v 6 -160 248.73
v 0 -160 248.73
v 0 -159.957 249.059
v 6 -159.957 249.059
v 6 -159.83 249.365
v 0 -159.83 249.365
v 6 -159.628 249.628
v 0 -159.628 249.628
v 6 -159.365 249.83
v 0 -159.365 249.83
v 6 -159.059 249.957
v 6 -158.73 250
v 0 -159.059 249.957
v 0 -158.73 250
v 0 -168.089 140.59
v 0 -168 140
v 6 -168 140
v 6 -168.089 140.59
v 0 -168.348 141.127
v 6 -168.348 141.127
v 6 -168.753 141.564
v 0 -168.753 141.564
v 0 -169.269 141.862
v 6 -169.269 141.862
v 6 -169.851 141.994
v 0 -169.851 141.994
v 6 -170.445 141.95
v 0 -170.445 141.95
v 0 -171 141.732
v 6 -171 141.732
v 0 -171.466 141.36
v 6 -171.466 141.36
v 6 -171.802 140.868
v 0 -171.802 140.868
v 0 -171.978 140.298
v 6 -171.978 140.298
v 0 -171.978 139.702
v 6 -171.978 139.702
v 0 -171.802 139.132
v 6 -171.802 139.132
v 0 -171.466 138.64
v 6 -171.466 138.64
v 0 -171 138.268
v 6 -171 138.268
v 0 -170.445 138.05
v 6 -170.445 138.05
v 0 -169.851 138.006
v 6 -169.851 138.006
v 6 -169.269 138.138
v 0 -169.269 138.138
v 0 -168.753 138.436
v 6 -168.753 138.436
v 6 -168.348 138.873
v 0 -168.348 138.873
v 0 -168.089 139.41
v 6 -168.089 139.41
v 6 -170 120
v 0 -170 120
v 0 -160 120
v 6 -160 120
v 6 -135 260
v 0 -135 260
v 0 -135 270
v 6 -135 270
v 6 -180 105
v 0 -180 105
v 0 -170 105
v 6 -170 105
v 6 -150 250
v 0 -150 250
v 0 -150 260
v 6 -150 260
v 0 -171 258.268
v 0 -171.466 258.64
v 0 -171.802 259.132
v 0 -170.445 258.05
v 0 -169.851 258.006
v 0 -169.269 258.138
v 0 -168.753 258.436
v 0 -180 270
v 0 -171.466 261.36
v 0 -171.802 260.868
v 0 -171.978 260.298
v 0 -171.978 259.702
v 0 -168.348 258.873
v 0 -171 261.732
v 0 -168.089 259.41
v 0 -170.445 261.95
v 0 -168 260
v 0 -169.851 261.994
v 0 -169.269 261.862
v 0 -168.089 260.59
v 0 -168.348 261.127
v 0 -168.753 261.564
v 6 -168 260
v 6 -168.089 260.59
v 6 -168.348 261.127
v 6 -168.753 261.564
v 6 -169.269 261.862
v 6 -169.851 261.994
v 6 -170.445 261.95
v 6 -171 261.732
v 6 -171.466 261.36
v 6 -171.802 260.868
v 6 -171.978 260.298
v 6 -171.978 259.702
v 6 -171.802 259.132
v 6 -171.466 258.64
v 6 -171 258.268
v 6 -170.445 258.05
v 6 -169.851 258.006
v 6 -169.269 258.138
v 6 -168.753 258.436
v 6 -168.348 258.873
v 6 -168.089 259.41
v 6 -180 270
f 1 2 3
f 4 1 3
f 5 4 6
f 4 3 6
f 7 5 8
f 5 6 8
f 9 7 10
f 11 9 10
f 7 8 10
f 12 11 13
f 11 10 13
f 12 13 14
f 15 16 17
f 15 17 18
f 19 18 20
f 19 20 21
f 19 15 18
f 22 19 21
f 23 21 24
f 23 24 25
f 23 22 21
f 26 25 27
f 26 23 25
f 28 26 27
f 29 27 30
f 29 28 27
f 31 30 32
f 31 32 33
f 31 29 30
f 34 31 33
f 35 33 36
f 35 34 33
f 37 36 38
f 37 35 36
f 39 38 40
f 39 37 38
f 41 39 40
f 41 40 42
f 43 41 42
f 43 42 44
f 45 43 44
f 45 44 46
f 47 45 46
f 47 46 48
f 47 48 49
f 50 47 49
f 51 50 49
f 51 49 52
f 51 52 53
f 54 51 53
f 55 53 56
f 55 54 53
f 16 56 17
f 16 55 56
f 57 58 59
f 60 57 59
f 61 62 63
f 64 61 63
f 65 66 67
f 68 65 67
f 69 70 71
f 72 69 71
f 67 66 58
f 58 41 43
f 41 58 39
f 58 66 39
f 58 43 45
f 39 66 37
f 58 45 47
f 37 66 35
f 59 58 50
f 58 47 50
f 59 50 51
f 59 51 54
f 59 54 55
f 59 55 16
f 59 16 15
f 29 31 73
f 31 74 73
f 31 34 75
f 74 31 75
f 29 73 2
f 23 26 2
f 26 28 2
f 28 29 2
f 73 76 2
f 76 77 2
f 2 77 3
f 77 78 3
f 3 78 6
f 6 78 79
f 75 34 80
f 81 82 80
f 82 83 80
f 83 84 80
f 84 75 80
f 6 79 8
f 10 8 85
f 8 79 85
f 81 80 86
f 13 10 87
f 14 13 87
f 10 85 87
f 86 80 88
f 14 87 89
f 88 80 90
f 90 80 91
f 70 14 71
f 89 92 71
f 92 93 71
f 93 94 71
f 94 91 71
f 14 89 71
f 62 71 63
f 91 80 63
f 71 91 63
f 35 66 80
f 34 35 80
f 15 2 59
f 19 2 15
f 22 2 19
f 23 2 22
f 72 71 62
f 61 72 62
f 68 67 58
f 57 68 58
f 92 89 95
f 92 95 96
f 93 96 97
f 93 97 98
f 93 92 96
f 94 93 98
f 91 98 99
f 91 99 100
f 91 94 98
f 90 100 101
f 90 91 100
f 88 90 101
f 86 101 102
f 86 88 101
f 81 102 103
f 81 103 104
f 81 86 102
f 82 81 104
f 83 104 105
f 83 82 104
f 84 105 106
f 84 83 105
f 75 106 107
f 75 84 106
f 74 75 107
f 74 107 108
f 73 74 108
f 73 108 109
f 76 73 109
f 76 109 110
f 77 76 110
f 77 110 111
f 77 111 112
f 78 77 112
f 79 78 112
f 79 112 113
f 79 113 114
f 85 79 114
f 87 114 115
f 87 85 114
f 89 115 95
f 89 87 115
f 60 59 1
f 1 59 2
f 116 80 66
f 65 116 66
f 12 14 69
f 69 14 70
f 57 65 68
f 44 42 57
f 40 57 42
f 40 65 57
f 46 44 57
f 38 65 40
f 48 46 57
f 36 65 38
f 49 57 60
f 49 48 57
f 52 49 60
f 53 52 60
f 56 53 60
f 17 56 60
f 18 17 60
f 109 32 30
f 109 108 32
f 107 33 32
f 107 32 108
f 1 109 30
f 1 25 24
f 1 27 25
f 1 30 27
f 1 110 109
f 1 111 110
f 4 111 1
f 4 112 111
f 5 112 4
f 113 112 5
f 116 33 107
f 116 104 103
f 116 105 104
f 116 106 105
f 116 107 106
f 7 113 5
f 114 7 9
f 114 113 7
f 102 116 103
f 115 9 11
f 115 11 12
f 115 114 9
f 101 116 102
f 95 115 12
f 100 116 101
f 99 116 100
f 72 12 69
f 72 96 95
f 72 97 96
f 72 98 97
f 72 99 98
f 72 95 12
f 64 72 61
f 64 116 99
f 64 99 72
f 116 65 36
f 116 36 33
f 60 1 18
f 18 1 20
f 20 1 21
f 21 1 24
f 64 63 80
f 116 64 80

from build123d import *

# Parameters (mm, degrees)
F0_R     = 2
F1_DEPTH = 6


with BuildPart() as f1:
    # F0 (on Right) → F1 (new body)
    with BuildSketch(Plane.YZ):
        with BuildLine():
            Line((-158.73, 250), (-150, 250))
            Line((-150, 250), (-150, 260))
            Line((-150, 260), (-135, 260))
            Line((-135, 260), (-135, 270))
            Line((-135, 270), (-180, 270))
            Line((-180, 270), (-180, 105))
            Line((-180, 105), (-170, 105))
            Line((-170, 105), (-170, 120))
            Line((-170, 120), (-160, 120))
            Line((-160, 120), (-160, 248.73))
            ThreePointArc((-160, 248.73), (-159.628026, 249.628026), (-158.73, 250))
        make_face()
        with Locations((-170, 140)):
            Circle(F0_R, mode=Mode.SUBTRACT)
        with Locations((-170, 260)):
            Circle(F0_R, mode=Mode.SUBTRACT)
    extrude(amount=F1_DEPTH)


solid = f1.part
